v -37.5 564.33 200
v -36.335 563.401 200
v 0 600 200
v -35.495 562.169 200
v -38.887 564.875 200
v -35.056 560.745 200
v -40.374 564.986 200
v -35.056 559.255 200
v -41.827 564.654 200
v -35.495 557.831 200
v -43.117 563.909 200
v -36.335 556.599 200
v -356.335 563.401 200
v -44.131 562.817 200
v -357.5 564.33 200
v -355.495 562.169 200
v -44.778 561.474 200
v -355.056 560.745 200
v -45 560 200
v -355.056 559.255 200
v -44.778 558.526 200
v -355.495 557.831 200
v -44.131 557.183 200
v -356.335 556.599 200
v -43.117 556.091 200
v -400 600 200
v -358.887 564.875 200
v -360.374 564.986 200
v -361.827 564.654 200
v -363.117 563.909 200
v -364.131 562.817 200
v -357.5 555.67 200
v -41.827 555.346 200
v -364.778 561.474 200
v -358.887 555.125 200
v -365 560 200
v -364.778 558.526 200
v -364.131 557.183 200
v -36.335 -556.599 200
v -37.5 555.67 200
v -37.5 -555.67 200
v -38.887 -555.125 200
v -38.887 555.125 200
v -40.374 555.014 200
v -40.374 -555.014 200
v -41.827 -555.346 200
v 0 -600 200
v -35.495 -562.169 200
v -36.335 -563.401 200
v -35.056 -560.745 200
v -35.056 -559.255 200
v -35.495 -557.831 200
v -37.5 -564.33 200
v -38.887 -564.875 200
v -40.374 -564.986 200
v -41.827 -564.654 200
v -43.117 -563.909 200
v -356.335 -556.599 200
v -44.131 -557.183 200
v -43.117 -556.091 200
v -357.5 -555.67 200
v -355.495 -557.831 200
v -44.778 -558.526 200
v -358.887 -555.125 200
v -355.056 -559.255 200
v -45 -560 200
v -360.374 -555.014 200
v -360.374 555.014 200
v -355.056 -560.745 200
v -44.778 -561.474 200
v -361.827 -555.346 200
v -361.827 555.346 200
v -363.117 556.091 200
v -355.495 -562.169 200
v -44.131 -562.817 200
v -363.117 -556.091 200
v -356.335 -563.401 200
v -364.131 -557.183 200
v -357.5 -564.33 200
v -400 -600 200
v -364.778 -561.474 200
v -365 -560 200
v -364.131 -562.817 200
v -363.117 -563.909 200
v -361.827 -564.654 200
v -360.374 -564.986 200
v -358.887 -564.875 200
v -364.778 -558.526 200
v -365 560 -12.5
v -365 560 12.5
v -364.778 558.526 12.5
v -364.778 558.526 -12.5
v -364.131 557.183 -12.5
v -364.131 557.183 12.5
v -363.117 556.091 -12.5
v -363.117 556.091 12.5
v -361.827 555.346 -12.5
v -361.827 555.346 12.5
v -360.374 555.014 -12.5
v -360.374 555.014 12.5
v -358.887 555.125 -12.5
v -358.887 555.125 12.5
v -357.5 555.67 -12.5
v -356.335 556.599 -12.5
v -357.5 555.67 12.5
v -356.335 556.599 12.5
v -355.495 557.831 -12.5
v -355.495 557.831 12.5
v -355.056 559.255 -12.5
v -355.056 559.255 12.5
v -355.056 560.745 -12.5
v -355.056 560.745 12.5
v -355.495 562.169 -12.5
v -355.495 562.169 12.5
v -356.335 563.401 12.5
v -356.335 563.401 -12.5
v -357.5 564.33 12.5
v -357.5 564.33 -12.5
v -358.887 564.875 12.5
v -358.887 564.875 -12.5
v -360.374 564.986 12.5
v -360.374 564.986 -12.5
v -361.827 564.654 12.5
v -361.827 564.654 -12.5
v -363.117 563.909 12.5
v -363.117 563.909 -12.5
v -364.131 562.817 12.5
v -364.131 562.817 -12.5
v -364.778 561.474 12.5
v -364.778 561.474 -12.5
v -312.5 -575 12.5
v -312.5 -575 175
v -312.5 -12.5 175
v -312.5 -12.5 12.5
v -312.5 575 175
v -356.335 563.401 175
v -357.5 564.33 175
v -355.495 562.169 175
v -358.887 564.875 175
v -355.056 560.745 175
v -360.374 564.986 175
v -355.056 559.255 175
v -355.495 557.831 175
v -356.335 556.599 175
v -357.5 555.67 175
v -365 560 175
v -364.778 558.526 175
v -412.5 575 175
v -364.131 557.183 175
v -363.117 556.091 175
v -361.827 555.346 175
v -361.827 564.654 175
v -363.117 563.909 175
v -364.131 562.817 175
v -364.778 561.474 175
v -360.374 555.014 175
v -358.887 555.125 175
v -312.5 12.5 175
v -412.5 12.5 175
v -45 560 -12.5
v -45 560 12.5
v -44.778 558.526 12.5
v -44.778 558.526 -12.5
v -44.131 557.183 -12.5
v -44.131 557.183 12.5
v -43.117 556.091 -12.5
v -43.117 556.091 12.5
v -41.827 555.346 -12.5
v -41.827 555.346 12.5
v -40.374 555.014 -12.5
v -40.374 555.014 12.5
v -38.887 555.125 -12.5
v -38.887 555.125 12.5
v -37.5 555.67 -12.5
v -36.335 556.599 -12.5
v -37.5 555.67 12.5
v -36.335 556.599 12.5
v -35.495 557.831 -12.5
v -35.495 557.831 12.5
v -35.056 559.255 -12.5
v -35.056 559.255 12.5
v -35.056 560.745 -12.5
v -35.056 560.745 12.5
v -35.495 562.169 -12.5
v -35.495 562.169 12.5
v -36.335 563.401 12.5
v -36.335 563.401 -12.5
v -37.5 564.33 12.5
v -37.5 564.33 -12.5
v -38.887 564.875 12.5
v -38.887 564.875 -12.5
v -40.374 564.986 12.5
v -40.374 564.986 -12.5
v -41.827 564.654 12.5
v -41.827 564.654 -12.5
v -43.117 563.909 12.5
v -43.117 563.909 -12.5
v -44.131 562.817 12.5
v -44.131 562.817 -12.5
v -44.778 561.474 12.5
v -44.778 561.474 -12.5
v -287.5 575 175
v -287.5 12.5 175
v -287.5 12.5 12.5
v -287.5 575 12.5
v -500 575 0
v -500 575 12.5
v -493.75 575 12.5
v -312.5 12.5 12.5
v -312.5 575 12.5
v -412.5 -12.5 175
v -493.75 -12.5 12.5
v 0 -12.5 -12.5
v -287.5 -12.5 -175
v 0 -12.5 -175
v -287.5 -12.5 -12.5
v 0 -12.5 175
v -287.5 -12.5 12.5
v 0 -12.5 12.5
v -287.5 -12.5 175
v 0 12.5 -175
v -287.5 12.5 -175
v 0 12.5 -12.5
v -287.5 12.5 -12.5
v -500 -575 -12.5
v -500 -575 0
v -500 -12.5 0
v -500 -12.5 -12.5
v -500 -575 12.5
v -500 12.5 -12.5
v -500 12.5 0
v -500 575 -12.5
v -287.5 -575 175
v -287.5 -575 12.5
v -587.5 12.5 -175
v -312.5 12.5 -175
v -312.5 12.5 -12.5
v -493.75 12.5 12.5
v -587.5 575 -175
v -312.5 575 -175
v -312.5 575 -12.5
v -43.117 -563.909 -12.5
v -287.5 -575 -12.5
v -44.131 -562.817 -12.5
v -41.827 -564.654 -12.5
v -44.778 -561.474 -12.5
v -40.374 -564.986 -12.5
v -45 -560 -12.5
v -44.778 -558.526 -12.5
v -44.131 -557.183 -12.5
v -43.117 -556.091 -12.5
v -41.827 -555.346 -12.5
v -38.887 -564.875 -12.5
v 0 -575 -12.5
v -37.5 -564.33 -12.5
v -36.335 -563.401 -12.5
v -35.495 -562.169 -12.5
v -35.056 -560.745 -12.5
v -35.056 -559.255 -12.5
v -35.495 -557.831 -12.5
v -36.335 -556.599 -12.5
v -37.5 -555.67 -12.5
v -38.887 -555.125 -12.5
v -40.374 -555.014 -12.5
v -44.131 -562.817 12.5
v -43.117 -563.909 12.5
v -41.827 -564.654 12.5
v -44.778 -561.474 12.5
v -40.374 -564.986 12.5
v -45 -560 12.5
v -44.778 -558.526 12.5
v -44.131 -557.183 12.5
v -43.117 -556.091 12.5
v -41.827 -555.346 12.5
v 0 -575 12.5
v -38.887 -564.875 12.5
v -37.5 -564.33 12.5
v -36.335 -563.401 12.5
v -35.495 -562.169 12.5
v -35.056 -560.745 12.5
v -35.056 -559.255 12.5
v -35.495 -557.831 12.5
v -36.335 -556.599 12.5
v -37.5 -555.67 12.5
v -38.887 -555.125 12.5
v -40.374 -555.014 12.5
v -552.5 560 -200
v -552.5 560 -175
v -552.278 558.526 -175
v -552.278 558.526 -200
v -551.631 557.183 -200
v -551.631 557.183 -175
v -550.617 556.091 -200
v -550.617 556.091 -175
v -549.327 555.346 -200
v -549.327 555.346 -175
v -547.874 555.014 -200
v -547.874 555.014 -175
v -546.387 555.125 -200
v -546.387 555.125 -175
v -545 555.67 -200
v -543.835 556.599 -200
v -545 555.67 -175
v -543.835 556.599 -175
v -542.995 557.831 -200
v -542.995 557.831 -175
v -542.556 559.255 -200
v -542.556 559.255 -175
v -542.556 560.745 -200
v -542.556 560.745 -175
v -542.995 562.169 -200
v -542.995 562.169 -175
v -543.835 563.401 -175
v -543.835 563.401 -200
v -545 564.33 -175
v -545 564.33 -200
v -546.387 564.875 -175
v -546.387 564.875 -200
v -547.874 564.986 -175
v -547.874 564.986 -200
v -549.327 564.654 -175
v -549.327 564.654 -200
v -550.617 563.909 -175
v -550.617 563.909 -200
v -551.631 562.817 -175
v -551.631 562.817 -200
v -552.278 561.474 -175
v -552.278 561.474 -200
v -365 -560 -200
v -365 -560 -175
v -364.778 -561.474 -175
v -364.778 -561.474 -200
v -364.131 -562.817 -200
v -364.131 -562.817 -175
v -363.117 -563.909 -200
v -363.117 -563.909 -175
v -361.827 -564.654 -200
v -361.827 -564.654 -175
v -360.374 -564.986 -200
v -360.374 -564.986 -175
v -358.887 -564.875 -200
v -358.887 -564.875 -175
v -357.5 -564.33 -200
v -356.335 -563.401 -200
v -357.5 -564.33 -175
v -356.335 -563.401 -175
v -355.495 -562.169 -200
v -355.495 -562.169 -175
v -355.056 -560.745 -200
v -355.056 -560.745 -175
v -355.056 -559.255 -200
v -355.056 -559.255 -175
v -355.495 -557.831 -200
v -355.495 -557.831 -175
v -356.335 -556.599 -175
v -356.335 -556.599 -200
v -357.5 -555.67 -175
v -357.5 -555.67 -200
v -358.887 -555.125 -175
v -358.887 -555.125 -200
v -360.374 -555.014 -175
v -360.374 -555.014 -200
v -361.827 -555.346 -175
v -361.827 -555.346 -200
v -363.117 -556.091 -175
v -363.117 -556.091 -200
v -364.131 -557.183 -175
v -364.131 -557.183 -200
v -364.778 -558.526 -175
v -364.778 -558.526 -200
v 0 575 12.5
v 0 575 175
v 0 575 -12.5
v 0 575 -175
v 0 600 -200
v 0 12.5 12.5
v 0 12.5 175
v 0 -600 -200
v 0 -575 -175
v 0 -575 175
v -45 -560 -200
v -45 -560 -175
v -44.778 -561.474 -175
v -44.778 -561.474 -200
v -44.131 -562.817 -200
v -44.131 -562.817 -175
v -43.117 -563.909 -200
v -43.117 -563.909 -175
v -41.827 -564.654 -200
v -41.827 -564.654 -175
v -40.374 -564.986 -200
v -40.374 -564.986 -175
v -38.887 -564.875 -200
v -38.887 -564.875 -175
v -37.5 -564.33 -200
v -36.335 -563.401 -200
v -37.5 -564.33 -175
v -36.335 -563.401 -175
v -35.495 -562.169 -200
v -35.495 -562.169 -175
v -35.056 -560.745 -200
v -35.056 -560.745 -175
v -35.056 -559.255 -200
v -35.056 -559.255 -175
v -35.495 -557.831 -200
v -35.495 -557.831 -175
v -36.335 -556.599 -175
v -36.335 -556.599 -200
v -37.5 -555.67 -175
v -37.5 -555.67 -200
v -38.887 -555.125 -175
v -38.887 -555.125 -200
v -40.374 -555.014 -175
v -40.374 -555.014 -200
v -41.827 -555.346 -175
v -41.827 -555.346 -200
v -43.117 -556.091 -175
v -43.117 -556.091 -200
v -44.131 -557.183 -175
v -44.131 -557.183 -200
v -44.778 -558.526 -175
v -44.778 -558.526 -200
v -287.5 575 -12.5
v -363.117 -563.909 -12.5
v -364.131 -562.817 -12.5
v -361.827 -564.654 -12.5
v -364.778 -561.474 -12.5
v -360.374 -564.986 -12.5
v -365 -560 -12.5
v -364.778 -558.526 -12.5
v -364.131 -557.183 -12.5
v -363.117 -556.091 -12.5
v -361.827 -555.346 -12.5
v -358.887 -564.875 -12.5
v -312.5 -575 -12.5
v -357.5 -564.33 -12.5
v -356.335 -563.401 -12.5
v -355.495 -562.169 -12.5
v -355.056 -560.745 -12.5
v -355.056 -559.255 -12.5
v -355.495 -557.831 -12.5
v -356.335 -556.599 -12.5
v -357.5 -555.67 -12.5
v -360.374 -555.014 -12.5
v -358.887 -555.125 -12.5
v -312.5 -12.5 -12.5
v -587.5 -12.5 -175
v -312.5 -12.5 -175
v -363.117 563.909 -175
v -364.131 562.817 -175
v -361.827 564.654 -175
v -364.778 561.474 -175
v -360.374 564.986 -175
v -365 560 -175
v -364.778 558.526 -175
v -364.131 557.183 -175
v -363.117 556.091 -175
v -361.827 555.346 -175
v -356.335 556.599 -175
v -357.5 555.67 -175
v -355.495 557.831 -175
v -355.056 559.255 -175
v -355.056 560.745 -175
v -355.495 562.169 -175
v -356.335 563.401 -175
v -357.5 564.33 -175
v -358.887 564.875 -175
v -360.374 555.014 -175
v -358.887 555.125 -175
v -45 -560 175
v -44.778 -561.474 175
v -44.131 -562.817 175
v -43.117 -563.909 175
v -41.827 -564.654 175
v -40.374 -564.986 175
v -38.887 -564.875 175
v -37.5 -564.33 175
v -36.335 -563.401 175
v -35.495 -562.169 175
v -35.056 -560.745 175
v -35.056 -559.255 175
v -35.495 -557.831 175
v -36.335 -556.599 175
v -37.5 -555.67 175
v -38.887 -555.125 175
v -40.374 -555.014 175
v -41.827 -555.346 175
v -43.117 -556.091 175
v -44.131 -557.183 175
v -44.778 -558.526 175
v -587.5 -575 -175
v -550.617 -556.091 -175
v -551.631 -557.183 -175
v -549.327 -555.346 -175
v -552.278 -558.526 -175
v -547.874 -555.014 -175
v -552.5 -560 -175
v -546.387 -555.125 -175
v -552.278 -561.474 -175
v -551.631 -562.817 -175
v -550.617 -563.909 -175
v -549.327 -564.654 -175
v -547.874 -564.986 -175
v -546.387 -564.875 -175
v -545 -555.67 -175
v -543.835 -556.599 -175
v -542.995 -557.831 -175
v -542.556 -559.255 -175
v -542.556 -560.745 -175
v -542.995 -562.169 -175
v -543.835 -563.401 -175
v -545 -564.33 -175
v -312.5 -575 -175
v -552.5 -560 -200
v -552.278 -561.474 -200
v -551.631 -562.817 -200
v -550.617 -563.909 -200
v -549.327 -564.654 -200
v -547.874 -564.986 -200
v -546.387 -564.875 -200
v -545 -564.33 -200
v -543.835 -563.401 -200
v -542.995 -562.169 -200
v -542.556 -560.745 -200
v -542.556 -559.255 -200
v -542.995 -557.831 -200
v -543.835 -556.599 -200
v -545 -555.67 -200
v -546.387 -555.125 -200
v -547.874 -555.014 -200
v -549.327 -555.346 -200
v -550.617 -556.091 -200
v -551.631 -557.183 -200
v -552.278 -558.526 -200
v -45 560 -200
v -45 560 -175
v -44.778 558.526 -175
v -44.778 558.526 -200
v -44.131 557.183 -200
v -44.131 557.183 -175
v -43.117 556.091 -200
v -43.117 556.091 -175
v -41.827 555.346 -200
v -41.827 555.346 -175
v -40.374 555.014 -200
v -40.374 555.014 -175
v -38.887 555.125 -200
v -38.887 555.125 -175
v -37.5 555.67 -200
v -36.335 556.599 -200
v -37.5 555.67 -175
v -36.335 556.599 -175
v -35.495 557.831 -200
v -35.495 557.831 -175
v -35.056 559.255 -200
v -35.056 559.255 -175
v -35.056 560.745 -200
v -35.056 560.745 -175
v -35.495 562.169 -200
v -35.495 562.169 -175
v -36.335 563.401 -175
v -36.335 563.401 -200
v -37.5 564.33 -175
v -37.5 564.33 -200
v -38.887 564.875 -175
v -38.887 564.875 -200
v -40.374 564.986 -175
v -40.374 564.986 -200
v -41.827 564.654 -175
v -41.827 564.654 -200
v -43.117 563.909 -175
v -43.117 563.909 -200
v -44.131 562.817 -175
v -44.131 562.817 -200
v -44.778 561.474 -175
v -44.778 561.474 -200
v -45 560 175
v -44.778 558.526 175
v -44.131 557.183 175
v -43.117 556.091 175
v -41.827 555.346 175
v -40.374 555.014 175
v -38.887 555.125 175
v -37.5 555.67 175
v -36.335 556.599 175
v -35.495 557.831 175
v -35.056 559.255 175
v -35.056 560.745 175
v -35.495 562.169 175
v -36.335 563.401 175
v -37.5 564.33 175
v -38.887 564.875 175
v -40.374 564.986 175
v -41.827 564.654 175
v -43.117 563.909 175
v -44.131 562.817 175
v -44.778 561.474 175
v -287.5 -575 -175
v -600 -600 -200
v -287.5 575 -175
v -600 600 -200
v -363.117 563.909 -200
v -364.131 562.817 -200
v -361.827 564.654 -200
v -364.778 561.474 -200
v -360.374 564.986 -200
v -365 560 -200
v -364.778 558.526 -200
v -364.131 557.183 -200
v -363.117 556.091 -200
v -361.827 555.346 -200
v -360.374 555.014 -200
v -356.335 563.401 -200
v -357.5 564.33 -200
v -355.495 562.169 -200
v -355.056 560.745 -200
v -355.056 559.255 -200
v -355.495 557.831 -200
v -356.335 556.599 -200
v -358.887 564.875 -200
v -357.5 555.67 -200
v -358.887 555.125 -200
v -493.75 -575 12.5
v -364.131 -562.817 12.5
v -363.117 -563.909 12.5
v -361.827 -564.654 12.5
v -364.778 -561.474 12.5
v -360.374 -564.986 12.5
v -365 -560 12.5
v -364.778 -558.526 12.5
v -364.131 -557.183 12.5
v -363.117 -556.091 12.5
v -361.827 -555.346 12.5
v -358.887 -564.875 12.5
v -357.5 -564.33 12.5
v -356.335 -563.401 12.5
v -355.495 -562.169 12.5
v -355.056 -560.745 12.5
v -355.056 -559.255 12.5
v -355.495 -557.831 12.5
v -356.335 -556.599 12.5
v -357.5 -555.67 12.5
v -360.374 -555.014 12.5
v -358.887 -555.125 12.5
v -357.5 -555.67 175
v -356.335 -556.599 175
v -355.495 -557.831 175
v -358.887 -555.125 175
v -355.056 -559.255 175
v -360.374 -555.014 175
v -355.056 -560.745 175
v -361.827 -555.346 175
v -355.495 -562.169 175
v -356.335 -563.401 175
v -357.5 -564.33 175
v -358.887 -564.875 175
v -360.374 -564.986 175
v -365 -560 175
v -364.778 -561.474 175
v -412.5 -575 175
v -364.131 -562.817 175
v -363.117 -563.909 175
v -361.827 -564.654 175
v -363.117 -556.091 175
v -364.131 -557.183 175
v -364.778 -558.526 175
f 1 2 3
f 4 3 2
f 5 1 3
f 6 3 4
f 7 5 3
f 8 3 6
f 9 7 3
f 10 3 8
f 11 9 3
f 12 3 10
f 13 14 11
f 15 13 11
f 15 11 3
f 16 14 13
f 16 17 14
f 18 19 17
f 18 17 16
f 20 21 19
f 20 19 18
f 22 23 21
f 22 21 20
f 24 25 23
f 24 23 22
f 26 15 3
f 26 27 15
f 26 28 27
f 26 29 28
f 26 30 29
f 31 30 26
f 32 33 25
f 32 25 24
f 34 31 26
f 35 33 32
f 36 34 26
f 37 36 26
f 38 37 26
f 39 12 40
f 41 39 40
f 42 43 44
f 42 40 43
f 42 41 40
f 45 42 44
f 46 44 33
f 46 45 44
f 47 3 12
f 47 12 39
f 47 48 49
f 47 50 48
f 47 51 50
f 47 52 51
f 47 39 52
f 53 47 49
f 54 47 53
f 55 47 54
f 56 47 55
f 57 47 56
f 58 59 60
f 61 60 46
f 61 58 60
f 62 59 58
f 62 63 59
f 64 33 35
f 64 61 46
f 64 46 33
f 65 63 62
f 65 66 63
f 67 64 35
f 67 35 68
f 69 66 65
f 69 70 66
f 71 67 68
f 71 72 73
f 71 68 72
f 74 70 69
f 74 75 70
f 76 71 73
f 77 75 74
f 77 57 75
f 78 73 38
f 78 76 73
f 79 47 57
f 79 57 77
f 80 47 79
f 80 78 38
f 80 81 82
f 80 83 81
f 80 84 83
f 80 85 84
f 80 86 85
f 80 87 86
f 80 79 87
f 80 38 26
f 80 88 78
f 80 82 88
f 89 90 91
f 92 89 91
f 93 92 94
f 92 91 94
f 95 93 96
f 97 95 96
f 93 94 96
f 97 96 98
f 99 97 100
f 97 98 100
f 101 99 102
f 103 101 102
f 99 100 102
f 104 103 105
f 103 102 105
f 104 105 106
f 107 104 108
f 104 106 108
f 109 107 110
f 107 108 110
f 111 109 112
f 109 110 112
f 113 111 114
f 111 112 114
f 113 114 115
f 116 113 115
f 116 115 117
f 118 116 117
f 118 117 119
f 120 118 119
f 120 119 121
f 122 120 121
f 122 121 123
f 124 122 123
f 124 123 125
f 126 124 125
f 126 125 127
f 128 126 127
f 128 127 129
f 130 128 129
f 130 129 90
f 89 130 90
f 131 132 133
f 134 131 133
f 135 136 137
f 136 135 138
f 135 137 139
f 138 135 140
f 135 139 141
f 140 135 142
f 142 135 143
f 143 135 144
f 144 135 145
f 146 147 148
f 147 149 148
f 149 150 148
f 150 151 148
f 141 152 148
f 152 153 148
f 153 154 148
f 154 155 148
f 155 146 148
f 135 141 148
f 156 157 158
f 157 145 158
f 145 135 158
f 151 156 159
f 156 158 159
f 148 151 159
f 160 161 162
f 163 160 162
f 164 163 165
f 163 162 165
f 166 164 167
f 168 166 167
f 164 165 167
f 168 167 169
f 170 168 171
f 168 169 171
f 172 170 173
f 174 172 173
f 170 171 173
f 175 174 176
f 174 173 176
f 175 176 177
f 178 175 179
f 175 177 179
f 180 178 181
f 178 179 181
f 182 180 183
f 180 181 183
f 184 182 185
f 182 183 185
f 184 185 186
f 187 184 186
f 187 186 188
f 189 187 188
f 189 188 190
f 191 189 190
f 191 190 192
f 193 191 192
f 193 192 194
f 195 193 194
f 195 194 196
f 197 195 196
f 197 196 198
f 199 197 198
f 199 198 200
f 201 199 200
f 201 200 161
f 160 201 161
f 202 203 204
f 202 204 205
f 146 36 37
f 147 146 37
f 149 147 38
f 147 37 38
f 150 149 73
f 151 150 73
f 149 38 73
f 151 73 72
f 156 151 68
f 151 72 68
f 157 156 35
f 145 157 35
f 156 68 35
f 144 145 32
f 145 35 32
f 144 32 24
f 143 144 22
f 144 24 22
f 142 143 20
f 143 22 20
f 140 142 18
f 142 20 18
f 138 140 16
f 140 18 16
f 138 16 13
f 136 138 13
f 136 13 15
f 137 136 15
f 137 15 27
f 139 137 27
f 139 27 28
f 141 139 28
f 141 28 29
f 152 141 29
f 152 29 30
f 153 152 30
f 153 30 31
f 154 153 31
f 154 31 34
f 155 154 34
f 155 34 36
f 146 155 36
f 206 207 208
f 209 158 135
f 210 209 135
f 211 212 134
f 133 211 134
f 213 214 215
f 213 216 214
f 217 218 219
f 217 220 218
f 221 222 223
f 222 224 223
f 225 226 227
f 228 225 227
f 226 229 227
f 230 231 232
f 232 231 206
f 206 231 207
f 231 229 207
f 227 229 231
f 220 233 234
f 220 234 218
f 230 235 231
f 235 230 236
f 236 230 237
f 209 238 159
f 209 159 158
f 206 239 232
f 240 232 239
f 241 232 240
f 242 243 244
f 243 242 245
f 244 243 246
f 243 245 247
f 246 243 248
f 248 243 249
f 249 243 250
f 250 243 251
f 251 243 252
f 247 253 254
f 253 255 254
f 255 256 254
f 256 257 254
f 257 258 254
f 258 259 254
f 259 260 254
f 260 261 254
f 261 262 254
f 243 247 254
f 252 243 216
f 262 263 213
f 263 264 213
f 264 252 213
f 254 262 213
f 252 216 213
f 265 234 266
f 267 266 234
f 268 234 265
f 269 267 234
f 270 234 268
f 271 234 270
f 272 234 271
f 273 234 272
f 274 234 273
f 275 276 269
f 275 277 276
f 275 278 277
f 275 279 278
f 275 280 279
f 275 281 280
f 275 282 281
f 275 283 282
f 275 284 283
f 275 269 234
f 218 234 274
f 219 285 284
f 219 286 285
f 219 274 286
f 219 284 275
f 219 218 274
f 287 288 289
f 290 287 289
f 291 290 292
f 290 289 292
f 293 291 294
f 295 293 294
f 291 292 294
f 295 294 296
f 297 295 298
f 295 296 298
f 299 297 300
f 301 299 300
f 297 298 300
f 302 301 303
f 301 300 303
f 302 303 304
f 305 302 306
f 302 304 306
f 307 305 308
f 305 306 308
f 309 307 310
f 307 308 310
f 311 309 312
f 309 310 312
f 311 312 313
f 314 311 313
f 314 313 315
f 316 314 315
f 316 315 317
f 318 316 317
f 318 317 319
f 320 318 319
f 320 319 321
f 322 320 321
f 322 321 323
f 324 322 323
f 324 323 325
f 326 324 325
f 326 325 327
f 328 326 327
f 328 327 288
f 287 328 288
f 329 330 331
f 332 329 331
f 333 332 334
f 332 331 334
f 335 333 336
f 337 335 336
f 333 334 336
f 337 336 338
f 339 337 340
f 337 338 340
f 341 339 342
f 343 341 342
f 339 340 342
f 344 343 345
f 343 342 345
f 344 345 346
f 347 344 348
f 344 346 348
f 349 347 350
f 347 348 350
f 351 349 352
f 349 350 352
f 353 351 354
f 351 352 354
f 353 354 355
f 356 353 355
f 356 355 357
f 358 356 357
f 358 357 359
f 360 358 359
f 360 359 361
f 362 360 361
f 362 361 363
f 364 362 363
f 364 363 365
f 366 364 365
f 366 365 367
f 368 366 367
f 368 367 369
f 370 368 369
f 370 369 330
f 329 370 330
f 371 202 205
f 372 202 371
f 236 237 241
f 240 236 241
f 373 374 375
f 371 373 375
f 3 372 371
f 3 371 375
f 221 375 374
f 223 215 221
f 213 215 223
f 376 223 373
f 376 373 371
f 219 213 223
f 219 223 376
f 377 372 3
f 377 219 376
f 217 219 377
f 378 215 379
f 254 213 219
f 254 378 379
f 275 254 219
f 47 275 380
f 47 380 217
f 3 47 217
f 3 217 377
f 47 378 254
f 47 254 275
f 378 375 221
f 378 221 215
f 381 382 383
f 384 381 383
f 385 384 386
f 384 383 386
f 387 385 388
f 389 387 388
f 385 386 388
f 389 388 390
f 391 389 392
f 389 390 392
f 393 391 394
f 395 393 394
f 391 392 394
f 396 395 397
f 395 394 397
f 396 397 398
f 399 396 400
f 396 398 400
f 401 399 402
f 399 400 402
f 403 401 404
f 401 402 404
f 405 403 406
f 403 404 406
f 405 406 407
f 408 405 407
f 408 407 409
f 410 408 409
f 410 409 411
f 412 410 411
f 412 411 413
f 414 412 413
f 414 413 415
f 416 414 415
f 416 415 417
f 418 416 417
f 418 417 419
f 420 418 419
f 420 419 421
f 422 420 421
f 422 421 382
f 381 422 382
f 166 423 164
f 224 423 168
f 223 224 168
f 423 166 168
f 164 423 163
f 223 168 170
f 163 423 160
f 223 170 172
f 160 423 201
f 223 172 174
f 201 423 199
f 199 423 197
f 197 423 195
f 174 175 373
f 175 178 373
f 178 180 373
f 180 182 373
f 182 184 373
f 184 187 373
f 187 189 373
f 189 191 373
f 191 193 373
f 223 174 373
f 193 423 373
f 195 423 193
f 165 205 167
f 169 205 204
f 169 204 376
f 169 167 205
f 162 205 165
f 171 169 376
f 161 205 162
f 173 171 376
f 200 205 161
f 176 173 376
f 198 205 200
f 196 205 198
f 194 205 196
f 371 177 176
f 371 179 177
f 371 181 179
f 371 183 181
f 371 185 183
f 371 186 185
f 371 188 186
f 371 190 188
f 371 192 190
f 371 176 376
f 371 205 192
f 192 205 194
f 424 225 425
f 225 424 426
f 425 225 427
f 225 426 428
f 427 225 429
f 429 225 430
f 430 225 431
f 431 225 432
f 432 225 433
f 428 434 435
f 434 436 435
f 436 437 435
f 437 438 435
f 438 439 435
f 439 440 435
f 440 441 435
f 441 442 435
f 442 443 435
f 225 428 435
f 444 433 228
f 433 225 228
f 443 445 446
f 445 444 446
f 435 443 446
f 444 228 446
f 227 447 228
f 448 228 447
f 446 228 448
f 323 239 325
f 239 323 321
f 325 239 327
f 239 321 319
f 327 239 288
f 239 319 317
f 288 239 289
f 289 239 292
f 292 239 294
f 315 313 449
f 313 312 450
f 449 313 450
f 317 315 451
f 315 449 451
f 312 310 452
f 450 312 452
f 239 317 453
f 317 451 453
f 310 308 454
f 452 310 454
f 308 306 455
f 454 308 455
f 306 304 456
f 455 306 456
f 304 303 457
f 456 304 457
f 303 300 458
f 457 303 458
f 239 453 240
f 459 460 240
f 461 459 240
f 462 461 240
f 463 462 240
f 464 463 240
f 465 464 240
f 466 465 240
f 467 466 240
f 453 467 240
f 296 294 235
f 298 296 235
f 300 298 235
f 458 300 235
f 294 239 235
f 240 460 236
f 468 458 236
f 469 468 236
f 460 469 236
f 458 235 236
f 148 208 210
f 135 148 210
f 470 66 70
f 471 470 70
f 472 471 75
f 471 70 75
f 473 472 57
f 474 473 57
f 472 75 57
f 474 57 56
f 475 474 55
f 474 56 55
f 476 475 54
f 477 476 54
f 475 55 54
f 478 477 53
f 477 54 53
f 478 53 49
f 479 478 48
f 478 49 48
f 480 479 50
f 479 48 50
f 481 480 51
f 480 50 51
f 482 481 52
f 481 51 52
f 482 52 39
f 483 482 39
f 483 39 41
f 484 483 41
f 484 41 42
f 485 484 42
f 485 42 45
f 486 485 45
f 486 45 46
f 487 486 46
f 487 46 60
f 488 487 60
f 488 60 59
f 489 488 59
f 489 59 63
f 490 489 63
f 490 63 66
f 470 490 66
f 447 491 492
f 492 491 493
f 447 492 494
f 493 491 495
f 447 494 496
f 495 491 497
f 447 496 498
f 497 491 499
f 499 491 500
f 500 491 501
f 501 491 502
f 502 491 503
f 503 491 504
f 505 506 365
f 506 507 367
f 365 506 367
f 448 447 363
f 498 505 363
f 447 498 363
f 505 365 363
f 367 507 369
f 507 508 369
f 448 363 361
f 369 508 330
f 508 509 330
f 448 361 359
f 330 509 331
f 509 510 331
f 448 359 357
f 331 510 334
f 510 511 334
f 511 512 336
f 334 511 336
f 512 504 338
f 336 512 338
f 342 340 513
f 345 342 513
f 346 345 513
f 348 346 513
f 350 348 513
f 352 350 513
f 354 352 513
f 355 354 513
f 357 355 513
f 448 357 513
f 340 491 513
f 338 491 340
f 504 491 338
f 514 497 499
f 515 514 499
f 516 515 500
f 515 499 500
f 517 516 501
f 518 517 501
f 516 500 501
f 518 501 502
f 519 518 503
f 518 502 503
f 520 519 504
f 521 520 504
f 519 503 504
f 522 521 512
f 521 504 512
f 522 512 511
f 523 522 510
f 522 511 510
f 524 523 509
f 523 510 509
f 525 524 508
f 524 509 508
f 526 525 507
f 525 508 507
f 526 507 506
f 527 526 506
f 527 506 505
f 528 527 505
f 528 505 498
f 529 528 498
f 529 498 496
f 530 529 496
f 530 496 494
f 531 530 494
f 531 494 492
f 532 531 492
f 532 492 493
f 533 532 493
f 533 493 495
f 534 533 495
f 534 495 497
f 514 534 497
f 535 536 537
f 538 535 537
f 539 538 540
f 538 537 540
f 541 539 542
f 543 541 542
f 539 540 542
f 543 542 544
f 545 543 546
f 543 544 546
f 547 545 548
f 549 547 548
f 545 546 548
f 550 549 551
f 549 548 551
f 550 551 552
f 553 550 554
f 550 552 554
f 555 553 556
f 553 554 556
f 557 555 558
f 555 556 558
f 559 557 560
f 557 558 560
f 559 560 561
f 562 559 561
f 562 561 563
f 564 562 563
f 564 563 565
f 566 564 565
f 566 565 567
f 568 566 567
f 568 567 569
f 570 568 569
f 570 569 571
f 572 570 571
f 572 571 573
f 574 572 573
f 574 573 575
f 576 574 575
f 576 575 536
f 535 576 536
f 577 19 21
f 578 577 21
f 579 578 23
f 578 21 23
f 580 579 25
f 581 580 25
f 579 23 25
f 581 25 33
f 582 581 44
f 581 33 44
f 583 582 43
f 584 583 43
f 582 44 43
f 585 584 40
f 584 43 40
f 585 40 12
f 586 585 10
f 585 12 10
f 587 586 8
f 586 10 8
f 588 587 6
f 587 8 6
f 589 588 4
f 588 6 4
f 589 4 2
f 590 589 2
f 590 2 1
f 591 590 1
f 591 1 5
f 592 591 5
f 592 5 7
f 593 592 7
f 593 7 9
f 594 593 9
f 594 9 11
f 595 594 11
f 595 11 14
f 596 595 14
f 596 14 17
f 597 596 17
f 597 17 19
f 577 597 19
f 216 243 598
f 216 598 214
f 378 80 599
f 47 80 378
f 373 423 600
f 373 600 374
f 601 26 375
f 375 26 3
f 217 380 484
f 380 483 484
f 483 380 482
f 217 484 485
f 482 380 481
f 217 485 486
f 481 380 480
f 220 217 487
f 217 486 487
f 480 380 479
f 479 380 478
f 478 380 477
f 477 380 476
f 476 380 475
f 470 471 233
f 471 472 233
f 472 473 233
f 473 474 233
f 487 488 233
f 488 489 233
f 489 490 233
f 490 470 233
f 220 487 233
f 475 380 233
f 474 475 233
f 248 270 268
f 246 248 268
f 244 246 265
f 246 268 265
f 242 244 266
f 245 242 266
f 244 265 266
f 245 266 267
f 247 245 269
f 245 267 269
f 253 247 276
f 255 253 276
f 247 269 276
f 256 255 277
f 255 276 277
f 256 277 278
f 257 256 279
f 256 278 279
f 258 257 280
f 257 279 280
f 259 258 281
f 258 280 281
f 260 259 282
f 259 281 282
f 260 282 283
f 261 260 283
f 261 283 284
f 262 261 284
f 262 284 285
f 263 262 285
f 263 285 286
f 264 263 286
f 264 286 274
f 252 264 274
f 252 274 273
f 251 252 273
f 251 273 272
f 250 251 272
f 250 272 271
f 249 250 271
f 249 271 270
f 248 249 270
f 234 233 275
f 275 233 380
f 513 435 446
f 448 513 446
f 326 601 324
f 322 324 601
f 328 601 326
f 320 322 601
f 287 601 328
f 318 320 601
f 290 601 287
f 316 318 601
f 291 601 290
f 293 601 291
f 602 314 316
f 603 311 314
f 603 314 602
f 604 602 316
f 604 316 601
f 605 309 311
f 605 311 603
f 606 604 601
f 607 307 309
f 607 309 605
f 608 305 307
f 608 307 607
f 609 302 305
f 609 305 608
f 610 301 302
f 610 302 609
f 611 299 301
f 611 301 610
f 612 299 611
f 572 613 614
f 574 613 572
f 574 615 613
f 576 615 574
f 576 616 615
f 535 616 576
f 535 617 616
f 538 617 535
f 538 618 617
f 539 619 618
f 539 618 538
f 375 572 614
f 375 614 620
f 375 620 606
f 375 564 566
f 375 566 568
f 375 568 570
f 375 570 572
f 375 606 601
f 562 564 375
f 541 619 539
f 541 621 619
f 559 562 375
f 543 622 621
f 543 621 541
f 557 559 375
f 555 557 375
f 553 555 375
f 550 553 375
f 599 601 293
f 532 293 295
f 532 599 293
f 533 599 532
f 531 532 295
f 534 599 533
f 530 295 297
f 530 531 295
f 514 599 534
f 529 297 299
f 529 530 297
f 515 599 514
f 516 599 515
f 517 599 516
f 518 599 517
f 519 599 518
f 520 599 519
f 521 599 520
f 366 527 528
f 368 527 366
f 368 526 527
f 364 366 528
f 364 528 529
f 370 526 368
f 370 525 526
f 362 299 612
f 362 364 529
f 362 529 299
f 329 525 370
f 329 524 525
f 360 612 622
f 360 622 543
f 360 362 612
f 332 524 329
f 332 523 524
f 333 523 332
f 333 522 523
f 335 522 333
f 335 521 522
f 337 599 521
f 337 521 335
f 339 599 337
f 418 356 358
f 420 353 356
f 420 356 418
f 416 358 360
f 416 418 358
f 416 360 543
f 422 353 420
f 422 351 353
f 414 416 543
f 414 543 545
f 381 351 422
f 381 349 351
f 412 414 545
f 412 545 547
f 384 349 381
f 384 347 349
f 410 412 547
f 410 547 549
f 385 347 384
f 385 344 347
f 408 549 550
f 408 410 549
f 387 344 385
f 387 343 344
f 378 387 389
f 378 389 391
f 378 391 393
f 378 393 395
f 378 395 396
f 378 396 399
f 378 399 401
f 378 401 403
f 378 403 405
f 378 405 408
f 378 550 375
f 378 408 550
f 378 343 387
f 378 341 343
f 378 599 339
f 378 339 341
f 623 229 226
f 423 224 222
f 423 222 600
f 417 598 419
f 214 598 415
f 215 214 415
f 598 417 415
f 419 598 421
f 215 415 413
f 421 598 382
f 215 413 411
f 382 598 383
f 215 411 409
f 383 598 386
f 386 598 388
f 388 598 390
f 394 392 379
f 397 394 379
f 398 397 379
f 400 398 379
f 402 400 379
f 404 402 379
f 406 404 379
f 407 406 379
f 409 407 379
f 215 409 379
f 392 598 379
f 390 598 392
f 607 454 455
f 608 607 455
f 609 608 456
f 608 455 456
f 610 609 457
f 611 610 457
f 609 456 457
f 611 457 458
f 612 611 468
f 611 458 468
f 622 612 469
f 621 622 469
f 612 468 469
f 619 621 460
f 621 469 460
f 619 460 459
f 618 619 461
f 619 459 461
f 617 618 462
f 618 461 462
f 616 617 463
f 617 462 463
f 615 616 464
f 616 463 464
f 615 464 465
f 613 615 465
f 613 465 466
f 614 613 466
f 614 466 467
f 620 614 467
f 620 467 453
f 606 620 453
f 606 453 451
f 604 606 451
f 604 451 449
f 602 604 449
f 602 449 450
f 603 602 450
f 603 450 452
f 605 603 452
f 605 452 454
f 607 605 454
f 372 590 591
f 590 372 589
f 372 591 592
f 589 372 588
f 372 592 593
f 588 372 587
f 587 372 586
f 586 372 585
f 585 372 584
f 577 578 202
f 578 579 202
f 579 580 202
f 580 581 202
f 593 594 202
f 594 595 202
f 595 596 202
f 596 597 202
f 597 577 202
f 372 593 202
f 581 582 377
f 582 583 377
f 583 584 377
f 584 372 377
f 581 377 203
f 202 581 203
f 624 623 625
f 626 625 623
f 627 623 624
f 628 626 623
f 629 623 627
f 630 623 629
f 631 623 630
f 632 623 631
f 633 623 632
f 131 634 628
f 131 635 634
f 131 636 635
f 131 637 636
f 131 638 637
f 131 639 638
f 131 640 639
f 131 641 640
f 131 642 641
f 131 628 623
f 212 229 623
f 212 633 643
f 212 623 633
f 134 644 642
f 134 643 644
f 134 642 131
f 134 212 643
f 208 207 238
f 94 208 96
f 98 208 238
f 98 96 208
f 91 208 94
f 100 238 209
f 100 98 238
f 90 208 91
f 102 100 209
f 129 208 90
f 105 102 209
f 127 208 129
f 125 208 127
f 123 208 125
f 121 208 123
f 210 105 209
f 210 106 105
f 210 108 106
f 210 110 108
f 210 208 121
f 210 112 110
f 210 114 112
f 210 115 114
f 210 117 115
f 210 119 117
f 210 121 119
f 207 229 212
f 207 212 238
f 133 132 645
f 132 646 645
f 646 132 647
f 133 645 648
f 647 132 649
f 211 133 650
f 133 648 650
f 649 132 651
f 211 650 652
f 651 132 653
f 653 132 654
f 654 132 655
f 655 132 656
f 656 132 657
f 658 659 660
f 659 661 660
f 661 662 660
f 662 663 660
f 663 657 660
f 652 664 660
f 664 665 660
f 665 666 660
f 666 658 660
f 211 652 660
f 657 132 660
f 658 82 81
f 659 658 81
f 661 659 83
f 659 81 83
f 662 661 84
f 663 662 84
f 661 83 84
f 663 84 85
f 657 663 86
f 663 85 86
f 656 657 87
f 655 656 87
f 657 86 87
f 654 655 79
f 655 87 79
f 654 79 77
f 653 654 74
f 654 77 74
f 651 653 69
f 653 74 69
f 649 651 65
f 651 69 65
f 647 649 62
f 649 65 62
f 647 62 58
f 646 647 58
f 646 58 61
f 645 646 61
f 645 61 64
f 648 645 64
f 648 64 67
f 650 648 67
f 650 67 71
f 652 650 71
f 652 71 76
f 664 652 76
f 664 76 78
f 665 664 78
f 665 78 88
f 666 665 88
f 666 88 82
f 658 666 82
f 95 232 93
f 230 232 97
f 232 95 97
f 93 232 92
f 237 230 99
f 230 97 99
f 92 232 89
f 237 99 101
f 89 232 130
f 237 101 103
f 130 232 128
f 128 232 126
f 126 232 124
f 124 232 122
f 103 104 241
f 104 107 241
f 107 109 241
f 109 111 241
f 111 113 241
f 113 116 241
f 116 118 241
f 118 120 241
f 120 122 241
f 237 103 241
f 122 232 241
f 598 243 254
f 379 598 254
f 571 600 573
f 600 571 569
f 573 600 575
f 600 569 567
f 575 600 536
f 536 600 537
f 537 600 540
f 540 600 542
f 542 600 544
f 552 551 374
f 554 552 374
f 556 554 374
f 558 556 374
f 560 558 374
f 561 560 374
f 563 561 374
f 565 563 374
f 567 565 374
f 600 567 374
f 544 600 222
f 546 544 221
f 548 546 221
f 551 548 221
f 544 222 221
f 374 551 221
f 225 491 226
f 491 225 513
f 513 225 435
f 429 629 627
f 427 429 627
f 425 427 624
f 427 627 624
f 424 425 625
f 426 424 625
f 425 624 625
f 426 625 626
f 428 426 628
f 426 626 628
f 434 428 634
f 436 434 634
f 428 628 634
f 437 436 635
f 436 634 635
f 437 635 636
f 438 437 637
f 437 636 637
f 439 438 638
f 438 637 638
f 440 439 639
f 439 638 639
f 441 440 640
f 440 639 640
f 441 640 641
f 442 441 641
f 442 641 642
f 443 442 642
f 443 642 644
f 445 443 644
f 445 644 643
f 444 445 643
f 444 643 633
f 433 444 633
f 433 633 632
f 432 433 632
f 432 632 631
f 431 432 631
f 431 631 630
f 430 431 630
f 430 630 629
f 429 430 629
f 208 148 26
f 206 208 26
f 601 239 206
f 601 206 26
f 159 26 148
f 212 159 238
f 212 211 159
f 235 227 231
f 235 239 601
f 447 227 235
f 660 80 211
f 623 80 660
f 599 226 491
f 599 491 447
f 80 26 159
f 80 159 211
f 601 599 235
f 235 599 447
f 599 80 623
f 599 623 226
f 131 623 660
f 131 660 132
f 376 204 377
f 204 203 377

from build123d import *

# Parameters (mm, degrees)
F1_DEPTH = 600
F2_T     = -25
F3_DEPTH = 12.5
F4_W     = 500
F4_H     = 1150
F5_DEPTH = 12.5
F7_W     = 1150
F7_H     = 350
F8_DEPTH = 12.5
F10_D    = 10


with BuildPart() as f1:
    # F0 (on Front) → F1 (new body, symmetric)
    with BuildSketch(Plane.XZ):
        Polygon((0, 200), (-400, 200), (-600, -200), (0, -200), align=None)
    extrude(amount=F1_DEPTH, both=True)

    # F2
    f2_openings = [f1.faces().sort_by_distance(p)[0] for p in [
        (0, 0, 0),
        (-500, 0, 0),
    ]]
    offset(amount=F2_T, openings=f2_openings)

    # F0 (on Front) → F3 (join, symmetric)
    with BuildSketch(Plane.XZ):
        Polygon((0, 200), (-400, 200), (-600, -200), (0, -200), align=None)
    extrude(amount=F3_DEPTH, both=True)

    # F4 (on Top) → F5 (join, symmetric)
    with BuildSketch(Plane.XY):
        with Locations((-250, 0)):
            Rectangle(F4_W, F4_H)
    extrude(amount=F5_DEPTH, both=True)

    # F7 (on offset) → F8 (join, symmetric)
    with BuildSketch(Plane.YZ.offset(-300)):
        Rectangle(F7_W, F7_H)
    extrude(amount=F8_DEPTH, both=True)

    # F10 (through all)
    with Locations(Plane(origin=(0, 0, -200), x_dir=(1, 0, 0), z_dir=(0, 0, -1))):
        with Locations((-40, 560), (-547.5, 560), (-40, -560), (-547.5, -560), (-360, 560), (-360, -560)):
            Hole(F10_D / 2)


solid = f1.part
